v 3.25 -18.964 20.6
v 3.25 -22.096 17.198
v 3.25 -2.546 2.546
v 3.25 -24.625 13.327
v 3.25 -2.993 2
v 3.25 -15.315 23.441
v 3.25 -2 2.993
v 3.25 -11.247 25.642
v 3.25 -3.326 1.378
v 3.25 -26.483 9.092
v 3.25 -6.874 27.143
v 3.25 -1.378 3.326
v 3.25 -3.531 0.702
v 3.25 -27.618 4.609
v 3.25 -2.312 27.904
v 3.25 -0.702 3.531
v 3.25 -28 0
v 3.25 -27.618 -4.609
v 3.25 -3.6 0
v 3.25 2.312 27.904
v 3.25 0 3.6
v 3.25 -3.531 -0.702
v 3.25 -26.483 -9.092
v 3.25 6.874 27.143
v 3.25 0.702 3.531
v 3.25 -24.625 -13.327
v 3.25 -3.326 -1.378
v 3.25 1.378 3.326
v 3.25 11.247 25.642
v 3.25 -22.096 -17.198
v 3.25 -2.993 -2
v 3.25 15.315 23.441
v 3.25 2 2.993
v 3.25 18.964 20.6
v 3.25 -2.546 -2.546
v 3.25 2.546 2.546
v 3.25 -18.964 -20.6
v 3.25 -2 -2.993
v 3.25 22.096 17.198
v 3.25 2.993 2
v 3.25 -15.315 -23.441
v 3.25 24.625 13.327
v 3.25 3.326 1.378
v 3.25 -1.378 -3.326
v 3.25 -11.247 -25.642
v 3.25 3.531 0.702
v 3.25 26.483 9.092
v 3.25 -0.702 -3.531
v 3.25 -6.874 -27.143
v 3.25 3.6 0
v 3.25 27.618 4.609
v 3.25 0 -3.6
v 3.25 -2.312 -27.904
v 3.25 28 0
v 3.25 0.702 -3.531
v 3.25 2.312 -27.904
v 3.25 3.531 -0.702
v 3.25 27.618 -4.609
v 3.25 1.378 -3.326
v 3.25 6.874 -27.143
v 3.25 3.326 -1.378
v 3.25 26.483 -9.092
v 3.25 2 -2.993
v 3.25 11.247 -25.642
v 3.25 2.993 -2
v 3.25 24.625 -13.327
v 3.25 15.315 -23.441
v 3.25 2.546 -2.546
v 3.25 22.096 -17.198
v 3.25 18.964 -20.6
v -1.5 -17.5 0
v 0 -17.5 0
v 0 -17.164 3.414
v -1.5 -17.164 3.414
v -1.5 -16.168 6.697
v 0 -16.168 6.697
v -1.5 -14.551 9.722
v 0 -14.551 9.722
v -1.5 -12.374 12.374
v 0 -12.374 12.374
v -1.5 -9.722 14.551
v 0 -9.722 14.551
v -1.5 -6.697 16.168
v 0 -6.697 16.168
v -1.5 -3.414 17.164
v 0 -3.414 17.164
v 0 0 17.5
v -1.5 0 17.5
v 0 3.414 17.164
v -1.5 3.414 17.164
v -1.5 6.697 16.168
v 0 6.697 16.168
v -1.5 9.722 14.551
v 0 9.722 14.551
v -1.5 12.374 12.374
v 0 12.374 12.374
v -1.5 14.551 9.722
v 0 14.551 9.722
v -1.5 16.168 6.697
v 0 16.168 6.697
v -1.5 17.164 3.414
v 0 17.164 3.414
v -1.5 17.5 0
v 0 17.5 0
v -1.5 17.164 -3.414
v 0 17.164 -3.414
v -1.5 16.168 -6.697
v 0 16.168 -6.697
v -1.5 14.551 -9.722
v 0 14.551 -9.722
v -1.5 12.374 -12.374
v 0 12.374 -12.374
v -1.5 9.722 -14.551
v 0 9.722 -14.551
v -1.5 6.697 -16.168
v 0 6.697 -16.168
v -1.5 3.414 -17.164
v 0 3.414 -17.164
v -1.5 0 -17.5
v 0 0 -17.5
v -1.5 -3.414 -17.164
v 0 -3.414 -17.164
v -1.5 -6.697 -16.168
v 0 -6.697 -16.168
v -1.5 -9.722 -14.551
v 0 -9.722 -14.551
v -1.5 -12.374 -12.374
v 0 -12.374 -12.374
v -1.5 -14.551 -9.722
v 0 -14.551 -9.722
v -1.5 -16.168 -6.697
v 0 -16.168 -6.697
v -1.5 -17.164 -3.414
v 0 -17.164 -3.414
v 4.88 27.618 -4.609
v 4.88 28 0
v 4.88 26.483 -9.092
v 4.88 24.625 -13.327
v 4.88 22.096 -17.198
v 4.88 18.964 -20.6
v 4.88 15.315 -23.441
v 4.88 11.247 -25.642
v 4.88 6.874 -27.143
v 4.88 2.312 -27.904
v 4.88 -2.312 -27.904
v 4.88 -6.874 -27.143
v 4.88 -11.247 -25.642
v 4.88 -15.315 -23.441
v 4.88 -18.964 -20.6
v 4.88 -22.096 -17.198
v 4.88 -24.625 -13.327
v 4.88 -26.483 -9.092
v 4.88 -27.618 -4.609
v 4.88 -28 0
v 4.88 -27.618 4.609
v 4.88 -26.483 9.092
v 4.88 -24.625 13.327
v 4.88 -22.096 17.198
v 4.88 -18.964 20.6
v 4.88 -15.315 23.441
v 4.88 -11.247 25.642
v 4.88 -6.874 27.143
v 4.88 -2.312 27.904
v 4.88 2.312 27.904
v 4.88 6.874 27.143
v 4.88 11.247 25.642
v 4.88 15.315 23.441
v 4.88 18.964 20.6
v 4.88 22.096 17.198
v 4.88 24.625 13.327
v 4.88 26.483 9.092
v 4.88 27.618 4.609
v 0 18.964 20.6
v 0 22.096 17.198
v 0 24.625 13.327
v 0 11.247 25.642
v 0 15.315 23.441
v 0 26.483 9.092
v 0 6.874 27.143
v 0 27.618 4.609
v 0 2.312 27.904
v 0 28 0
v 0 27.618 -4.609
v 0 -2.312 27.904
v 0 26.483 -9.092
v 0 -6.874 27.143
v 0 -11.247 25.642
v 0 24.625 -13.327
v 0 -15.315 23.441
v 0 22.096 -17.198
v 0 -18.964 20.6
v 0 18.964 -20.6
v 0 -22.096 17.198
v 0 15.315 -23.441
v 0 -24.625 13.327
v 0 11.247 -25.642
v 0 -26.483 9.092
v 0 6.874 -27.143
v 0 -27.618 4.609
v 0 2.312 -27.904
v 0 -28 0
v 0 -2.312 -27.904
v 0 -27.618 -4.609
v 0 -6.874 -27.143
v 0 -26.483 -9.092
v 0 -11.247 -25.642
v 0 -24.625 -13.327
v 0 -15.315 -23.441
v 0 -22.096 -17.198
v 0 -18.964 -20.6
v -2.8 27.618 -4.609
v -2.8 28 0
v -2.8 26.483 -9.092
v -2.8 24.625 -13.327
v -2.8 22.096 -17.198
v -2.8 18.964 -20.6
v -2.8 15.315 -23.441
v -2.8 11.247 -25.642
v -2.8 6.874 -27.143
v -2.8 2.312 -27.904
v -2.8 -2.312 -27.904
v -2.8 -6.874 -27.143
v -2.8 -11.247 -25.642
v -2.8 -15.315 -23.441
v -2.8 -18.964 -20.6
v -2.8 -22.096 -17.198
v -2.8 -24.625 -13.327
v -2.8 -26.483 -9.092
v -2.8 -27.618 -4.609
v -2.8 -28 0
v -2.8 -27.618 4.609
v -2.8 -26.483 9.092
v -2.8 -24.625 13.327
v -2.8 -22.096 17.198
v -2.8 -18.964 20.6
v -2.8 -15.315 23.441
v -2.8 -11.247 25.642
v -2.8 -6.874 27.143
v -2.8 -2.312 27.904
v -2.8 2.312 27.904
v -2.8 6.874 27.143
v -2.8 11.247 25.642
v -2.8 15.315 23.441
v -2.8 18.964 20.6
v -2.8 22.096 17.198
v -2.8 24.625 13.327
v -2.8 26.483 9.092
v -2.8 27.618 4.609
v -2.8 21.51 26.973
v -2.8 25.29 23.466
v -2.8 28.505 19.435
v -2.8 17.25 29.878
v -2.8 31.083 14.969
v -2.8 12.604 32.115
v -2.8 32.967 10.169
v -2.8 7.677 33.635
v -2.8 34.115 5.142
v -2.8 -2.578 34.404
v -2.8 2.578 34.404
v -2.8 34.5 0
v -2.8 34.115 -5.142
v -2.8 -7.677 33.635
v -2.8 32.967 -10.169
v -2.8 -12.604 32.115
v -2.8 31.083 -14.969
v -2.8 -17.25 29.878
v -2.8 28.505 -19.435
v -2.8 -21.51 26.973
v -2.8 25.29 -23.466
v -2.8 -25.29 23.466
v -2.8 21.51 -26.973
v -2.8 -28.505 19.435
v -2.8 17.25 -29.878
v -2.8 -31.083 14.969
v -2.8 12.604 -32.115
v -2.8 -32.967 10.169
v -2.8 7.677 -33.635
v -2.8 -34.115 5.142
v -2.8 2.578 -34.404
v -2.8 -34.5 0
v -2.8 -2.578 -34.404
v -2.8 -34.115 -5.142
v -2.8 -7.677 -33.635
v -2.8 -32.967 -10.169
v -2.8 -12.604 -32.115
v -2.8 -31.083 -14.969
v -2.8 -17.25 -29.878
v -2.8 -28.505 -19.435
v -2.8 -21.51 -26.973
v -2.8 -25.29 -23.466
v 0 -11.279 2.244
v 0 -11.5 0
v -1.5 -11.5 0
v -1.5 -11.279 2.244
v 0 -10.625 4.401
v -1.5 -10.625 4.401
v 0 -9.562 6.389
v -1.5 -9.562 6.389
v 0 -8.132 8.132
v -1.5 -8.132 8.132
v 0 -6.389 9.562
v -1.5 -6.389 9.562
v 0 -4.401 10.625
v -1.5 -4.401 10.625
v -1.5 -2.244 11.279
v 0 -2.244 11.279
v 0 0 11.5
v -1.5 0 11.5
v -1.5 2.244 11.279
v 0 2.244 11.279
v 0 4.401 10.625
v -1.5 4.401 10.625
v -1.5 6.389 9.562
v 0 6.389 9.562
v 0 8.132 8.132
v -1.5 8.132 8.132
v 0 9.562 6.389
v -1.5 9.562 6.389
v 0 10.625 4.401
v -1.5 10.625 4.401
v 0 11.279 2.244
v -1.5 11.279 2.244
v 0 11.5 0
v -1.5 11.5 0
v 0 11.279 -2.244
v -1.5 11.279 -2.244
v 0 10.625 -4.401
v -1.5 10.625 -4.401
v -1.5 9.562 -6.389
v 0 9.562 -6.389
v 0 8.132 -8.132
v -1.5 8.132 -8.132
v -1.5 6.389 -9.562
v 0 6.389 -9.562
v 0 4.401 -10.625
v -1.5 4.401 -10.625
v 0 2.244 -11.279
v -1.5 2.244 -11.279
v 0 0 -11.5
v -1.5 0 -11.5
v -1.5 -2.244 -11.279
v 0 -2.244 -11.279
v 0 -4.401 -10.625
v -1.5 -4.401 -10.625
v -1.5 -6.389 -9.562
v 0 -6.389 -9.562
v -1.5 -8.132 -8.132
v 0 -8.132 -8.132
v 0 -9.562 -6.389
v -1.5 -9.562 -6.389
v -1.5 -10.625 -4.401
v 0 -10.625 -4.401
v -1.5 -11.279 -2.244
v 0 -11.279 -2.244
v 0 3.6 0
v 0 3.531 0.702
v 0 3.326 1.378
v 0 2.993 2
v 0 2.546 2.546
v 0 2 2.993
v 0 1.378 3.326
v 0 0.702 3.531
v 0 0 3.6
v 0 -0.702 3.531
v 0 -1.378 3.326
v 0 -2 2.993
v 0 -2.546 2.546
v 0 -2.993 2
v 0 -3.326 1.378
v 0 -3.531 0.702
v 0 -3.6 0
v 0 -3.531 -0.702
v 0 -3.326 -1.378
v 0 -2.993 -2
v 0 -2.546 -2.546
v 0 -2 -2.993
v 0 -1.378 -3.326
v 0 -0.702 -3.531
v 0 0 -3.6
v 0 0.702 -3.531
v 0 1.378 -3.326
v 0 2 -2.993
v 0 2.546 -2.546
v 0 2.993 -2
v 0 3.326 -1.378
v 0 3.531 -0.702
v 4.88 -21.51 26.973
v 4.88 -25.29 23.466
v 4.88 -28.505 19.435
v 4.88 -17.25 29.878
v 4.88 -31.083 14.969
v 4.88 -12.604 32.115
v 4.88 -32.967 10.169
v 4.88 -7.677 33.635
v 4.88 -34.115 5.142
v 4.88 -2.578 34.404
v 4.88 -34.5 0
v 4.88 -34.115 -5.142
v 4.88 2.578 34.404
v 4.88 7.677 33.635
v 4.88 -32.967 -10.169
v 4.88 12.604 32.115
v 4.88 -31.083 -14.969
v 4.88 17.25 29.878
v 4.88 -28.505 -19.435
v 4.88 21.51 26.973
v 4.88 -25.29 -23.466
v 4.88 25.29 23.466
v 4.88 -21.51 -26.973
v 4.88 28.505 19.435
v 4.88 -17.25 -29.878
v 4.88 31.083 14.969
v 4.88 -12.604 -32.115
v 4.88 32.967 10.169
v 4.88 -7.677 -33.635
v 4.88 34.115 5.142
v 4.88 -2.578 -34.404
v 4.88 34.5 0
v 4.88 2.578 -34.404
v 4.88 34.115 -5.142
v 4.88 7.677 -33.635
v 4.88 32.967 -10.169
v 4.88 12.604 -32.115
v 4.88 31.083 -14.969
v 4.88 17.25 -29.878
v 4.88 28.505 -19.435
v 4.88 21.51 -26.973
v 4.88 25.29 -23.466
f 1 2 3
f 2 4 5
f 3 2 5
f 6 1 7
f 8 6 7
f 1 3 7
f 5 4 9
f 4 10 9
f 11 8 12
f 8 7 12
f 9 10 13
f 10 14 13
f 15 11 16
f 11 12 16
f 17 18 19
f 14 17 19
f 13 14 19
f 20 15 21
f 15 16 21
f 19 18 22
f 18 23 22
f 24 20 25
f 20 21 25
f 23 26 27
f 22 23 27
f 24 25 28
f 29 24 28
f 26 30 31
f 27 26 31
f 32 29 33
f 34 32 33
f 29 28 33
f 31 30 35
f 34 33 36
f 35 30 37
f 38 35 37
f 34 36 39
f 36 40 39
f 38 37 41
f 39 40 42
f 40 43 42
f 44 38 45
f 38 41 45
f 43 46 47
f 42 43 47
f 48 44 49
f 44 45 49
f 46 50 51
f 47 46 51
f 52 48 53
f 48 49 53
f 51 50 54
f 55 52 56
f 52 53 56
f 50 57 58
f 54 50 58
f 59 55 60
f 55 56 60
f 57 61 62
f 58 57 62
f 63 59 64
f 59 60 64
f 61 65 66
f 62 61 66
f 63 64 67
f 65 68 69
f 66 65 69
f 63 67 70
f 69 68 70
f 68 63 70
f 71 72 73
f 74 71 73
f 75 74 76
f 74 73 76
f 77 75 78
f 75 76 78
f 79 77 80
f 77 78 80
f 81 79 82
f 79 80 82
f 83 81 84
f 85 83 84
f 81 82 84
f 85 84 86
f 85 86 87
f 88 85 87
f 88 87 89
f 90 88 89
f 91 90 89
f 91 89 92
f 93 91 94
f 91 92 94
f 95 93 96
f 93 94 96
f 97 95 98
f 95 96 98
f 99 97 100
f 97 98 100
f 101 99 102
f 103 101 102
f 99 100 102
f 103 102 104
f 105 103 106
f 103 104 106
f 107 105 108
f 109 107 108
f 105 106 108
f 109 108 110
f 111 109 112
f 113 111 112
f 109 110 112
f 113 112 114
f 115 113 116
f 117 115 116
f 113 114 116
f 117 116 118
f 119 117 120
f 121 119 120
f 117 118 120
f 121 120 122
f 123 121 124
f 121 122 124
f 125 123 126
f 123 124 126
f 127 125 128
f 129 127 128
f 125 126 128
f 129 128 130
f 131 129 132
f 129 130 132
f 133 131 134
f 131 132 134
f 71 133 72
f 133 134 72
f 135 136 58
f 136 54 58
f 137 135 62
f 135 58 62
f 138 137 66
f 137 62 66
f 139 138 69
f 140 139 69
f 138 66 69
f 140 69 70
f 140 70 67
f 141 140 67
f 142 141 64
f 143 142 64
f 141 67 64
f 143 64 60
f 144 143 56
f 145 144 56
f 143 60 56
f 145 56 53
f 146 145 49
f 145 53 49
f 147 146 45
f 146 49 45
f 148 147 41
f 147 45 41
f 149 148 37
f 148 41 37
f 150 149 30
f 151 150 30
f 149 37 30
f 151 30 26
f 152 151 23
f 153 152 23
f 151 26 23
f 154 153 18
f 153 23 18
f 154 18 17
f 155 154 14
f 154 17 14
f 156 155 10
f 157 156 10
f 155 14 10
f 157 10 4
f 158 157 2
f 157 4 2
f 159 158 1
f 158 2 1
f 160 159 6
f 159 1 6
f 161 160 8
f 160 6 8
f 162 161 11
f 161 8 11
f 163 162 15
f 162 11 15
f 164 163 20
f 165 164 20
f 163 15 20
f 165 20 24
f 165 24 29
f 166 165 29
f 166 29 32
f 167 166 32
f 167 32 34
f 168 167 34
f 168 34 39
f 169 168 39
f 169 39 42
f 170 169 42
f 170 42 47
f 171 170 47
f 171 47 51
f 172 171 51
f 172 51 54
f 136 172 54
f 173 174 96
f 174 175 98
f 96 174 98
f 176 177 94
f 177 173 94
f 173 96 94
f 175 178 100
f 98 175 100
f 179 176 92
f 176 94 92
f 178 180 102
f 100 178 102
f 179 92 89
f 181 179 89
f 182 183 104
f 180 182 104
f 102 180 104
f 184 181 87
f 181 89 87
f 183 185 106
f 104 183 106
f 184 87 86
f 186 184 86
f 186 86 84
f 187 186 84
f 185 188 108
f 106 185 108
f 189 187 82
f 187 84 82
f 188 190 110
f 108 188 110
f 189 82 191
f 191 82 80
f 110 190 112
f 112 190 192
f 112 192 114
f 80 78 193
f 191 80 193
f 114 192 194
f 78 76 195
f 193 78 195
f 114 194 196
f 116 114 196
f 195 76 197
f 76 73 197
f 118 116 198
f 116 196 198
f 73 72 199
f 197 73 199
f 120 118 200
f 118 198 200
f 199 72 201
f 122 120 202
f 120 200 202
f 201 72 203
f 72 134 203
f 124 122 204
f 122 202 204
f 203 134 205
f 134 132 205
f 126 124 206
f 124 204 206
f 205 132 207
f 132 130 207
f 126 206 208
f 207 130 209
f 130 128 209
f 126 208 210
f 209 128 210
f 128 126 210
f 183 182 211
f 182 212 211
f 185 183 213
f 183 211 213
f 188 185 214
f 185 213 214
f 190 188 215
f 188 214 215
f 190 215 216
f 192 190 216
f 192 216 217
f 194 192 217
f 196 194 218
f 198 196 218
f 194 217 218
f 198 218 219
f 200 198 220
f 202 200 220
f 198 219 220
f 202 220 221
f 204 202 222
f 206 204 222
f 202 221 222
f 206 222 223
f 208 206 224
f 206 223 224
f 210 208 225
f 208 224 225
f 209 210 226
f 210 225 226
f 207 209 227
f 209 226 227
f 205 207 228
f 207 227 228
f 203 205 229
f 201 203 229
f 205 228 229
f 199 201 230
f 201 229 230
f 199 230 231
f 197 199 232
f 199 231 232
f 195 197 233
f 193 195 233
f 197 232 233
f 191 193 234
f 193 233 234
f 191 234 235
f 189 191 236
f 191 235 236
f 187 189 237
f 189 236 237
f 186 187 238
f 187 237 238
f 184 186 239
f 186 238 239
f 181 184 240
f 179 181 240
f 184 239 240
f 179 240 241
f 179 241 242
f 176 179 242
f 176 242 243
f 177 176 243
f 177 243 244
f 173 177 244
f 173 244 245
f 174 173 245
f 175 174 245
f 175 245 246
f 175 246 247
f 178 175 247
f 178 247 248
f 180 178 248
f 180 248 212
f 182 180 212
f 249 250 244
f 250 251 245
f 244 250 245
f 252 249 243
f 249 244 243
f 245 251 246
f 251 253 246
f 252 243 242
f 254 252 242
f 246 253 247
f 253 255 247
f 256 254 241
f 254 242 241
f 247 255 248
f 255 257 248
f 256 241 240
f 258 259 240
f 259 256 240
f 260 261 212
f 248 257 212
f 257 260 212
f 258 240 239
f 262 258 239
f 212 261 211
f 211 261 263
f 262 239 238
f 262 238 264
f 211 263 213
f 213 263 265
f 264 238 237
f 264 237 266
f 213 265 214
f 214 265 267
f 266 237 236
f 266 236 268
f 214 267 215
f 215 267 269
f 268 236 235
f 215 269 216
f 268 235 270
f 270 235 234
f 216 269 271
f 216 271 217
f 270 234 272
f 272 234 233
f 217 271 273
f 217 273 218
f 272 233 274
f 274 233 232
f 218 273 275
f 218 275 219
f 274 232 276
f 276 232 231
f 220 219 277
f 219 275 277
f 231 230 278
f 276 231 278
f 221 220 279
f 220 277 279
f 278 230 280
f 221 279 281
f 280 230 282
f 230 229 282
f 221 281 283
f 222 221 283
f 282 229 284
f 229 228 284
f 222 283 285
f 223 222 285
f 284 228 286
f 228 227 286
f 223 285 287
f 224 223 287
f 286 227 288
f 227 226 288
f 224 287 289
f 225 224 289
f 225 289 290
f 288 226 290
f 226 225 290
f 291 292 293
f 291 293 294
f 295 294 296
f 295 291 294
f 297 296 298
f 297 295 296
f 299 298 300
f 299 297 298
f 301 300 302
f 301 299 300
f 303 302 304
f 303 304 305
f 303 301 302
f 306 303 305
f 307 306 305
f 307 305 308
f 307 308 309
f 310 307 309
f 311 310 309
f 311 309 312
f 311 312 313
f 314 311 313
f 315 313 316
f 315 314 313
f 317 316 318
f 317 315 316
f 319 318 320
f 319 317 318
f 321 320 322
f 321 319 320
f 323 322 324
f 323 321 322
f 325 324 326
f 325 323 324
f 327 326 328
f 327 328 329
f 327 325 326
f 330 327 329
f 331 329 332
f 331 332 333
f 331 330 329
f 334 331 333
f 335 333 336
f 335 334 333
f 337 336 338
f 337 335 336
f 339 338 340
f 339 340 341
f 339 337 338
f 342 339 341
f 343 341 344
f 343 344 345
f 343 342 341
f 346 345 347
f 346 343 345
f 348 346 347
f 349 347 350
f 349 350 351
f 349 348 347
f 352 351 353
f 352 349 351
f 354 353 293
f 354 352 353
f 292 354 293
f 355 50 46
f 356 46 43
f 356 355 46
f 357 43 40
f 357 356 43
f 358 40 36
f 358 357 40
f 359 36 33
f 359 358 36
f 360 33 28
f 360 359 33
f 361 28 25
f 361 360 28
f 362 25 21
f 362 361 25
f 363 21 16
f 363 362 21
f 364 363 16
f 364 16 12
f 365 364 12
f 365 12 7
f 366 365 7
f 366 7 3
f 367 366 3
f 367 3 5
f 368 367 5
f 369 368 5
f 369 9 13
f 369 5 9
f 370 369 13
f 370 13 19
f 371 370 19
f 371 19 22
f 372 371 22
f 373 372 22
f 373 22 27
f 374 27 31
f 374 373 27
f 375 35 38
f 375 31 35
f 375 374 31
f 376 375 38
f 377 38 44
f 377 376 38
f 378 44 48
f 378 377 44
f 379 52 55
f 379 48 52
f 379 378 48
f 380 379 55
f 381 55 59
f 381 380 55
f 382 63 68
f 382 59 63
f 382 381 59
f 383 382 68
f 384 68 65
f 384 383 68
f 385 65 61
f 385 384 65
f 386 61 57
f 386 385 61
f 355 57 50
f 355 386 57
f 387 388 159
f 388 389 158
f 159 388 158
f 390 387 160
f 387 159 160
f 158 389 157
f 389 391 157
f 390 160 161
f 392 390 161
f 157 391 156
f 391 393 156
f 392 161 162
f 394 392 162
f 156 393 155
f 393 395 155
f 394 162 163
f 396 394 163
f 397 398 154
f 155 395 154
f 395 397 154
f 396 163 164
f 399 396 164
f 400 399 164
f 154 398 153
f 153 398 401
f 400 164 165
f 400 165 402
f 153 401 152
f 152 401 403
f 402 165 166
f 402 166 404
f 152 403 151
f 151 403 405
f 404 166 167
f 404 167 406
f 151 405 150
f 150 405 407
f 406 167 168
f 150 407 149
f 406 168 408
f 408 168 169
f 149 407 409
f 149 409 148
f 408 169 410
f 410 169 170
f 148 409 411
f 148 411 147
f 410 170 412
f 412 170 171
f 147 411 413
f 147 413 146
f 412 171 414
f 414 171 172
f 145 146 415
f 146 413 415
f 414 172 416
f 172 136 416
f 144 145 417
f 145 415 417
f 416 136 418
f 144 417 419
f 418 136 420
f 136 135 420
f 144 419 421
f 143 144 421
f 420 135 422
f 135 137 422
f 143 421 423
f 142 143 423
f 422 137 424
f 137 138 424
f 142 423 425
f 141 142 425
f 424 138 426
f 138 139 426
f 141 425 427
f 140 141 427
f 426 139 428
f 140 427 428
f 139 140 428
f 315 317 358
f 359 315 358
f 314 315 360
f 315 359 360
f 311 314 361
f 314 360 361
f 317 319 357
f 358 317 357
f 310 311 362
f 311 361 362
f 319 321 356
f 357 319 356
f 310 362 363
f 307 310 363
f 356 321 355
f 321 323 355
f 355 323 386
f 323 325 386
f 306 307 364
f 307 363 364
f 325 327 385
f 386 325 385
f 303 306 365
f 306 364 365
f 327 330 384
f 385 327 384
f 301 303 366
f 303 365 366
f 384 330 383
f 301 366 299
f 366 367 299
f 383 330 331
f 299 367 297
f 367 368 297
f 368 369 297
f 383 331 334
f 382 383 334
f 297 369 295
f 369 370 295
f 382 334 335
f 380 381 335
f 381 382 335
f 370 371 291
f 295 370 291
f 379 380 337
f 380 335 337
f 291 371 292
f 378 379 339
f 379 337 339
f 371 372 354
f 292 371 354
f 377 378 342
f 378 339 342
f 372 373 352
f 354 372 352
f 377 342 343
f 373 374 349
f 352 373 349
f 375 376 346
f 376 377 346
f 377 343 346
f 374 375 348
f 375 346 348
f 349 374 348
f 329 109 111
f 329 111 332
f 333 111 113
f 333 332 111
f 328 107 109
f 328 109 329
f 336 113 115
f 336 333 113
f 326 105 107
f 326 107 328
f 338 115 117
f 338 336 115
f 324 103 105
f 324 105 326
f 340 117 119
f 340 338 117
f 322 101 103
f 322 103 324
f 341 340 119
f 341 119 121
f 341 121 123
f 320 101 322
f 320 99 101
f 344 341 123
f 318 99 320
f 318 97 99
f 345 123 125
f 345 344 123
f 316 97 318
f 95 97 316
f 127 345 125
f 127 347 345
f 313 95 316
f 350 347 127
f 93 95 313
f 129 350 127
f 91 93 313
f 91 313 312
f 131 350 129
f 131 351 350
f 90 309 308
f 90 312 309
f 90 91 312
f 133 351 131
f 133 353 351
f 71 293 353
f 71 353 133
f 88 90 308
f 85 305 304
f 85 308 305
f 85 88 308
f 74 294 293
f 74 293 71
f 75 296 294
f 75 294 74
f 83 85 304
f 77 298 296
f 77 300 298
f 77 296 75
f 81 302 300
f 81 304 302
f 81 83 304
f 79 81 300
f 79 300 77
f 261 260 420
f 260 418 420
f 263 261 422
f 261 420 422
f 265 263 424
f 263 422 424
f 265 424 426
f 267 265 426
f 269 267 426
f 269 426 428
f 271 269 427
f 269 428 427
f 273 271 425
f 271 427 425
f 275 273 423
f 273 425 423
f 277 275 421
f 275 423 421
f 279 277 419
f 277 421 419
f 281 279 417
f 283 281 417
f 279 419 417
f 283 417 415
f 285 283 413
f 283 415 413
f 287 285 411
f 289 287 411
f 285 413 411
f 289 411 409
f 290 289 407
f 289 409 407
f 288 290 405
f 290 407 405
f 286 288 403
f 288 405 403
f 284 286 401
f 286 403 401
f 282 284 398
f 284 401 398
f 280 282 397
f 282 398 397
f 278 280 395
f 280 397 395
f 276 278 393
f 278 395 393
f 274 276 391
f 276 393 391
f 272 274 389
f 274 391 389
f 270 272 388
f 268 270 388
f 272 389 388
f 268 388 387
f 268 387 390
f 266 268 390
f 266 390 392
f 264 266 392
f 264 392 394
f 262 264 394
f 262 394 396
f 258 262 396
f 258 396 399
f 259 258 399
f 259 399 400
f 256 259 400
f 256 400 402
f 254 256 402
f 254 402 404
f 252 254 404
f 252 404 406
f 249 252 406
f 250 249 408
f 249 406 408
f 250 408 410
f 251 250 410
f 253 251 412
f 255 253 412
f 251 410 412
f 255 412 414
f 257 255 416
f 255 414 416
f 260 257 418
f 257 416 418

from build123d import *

# Parameters (mm, degrees)
SKETCH2_R           = 17.5
SKETCH2_R_2         = 11.5
BOSS_EXTRUDE1_DEPTH = 1.5
SKETCH4_R           = 3.6
CUT_EXTRUDE2_DEPTH  = 50.033808745


with BuildPart() as part:
    # Sketch1 → Revolve1 (revolve)
    with BuildSketch(Plane.XY):
        Polygon((0, 0), (0, 28), (-2.8, 28), (-2.8, 34.5), (4.88, 34.5), (4.88, 28), (3.25, 28), (3.25, 0), align=None)
    revolve(axis=Axis((3.25, 0, 0), (-1, 0, 0)))

    # Sketch2 → Boss-Extrude1 (add)
    with BuildSketch(Plane.ZY):
        with Locations(Location((0, 0, 0), (0, 0, 270))):
            Circle(SKETCH2_R)
        with Locations(Location((0, 0, 0), (0, 0, 270))):
            Circle(SKETCH2_R_2, mode=Mode.SUBTRACT)
    extrude(amount=BOSS_EXTRUDE1_DEPTH)

    # Sketch4 → Cut-Extrude2 (cut, through all)
    with BuildSketch(Plane(origin=(0, 0, 0), x_dir=(0, 0, -1), z_dir=(1, 0, 0))):
        with Locations(Location((0, 0, 0), (0, 0, 90))):
            Circle(SKETCH4_R)
    extrude(amount=CUT_EXTRUDE2_DEPTH, mode=Mode.SUBTRACT)


solid = part.part
